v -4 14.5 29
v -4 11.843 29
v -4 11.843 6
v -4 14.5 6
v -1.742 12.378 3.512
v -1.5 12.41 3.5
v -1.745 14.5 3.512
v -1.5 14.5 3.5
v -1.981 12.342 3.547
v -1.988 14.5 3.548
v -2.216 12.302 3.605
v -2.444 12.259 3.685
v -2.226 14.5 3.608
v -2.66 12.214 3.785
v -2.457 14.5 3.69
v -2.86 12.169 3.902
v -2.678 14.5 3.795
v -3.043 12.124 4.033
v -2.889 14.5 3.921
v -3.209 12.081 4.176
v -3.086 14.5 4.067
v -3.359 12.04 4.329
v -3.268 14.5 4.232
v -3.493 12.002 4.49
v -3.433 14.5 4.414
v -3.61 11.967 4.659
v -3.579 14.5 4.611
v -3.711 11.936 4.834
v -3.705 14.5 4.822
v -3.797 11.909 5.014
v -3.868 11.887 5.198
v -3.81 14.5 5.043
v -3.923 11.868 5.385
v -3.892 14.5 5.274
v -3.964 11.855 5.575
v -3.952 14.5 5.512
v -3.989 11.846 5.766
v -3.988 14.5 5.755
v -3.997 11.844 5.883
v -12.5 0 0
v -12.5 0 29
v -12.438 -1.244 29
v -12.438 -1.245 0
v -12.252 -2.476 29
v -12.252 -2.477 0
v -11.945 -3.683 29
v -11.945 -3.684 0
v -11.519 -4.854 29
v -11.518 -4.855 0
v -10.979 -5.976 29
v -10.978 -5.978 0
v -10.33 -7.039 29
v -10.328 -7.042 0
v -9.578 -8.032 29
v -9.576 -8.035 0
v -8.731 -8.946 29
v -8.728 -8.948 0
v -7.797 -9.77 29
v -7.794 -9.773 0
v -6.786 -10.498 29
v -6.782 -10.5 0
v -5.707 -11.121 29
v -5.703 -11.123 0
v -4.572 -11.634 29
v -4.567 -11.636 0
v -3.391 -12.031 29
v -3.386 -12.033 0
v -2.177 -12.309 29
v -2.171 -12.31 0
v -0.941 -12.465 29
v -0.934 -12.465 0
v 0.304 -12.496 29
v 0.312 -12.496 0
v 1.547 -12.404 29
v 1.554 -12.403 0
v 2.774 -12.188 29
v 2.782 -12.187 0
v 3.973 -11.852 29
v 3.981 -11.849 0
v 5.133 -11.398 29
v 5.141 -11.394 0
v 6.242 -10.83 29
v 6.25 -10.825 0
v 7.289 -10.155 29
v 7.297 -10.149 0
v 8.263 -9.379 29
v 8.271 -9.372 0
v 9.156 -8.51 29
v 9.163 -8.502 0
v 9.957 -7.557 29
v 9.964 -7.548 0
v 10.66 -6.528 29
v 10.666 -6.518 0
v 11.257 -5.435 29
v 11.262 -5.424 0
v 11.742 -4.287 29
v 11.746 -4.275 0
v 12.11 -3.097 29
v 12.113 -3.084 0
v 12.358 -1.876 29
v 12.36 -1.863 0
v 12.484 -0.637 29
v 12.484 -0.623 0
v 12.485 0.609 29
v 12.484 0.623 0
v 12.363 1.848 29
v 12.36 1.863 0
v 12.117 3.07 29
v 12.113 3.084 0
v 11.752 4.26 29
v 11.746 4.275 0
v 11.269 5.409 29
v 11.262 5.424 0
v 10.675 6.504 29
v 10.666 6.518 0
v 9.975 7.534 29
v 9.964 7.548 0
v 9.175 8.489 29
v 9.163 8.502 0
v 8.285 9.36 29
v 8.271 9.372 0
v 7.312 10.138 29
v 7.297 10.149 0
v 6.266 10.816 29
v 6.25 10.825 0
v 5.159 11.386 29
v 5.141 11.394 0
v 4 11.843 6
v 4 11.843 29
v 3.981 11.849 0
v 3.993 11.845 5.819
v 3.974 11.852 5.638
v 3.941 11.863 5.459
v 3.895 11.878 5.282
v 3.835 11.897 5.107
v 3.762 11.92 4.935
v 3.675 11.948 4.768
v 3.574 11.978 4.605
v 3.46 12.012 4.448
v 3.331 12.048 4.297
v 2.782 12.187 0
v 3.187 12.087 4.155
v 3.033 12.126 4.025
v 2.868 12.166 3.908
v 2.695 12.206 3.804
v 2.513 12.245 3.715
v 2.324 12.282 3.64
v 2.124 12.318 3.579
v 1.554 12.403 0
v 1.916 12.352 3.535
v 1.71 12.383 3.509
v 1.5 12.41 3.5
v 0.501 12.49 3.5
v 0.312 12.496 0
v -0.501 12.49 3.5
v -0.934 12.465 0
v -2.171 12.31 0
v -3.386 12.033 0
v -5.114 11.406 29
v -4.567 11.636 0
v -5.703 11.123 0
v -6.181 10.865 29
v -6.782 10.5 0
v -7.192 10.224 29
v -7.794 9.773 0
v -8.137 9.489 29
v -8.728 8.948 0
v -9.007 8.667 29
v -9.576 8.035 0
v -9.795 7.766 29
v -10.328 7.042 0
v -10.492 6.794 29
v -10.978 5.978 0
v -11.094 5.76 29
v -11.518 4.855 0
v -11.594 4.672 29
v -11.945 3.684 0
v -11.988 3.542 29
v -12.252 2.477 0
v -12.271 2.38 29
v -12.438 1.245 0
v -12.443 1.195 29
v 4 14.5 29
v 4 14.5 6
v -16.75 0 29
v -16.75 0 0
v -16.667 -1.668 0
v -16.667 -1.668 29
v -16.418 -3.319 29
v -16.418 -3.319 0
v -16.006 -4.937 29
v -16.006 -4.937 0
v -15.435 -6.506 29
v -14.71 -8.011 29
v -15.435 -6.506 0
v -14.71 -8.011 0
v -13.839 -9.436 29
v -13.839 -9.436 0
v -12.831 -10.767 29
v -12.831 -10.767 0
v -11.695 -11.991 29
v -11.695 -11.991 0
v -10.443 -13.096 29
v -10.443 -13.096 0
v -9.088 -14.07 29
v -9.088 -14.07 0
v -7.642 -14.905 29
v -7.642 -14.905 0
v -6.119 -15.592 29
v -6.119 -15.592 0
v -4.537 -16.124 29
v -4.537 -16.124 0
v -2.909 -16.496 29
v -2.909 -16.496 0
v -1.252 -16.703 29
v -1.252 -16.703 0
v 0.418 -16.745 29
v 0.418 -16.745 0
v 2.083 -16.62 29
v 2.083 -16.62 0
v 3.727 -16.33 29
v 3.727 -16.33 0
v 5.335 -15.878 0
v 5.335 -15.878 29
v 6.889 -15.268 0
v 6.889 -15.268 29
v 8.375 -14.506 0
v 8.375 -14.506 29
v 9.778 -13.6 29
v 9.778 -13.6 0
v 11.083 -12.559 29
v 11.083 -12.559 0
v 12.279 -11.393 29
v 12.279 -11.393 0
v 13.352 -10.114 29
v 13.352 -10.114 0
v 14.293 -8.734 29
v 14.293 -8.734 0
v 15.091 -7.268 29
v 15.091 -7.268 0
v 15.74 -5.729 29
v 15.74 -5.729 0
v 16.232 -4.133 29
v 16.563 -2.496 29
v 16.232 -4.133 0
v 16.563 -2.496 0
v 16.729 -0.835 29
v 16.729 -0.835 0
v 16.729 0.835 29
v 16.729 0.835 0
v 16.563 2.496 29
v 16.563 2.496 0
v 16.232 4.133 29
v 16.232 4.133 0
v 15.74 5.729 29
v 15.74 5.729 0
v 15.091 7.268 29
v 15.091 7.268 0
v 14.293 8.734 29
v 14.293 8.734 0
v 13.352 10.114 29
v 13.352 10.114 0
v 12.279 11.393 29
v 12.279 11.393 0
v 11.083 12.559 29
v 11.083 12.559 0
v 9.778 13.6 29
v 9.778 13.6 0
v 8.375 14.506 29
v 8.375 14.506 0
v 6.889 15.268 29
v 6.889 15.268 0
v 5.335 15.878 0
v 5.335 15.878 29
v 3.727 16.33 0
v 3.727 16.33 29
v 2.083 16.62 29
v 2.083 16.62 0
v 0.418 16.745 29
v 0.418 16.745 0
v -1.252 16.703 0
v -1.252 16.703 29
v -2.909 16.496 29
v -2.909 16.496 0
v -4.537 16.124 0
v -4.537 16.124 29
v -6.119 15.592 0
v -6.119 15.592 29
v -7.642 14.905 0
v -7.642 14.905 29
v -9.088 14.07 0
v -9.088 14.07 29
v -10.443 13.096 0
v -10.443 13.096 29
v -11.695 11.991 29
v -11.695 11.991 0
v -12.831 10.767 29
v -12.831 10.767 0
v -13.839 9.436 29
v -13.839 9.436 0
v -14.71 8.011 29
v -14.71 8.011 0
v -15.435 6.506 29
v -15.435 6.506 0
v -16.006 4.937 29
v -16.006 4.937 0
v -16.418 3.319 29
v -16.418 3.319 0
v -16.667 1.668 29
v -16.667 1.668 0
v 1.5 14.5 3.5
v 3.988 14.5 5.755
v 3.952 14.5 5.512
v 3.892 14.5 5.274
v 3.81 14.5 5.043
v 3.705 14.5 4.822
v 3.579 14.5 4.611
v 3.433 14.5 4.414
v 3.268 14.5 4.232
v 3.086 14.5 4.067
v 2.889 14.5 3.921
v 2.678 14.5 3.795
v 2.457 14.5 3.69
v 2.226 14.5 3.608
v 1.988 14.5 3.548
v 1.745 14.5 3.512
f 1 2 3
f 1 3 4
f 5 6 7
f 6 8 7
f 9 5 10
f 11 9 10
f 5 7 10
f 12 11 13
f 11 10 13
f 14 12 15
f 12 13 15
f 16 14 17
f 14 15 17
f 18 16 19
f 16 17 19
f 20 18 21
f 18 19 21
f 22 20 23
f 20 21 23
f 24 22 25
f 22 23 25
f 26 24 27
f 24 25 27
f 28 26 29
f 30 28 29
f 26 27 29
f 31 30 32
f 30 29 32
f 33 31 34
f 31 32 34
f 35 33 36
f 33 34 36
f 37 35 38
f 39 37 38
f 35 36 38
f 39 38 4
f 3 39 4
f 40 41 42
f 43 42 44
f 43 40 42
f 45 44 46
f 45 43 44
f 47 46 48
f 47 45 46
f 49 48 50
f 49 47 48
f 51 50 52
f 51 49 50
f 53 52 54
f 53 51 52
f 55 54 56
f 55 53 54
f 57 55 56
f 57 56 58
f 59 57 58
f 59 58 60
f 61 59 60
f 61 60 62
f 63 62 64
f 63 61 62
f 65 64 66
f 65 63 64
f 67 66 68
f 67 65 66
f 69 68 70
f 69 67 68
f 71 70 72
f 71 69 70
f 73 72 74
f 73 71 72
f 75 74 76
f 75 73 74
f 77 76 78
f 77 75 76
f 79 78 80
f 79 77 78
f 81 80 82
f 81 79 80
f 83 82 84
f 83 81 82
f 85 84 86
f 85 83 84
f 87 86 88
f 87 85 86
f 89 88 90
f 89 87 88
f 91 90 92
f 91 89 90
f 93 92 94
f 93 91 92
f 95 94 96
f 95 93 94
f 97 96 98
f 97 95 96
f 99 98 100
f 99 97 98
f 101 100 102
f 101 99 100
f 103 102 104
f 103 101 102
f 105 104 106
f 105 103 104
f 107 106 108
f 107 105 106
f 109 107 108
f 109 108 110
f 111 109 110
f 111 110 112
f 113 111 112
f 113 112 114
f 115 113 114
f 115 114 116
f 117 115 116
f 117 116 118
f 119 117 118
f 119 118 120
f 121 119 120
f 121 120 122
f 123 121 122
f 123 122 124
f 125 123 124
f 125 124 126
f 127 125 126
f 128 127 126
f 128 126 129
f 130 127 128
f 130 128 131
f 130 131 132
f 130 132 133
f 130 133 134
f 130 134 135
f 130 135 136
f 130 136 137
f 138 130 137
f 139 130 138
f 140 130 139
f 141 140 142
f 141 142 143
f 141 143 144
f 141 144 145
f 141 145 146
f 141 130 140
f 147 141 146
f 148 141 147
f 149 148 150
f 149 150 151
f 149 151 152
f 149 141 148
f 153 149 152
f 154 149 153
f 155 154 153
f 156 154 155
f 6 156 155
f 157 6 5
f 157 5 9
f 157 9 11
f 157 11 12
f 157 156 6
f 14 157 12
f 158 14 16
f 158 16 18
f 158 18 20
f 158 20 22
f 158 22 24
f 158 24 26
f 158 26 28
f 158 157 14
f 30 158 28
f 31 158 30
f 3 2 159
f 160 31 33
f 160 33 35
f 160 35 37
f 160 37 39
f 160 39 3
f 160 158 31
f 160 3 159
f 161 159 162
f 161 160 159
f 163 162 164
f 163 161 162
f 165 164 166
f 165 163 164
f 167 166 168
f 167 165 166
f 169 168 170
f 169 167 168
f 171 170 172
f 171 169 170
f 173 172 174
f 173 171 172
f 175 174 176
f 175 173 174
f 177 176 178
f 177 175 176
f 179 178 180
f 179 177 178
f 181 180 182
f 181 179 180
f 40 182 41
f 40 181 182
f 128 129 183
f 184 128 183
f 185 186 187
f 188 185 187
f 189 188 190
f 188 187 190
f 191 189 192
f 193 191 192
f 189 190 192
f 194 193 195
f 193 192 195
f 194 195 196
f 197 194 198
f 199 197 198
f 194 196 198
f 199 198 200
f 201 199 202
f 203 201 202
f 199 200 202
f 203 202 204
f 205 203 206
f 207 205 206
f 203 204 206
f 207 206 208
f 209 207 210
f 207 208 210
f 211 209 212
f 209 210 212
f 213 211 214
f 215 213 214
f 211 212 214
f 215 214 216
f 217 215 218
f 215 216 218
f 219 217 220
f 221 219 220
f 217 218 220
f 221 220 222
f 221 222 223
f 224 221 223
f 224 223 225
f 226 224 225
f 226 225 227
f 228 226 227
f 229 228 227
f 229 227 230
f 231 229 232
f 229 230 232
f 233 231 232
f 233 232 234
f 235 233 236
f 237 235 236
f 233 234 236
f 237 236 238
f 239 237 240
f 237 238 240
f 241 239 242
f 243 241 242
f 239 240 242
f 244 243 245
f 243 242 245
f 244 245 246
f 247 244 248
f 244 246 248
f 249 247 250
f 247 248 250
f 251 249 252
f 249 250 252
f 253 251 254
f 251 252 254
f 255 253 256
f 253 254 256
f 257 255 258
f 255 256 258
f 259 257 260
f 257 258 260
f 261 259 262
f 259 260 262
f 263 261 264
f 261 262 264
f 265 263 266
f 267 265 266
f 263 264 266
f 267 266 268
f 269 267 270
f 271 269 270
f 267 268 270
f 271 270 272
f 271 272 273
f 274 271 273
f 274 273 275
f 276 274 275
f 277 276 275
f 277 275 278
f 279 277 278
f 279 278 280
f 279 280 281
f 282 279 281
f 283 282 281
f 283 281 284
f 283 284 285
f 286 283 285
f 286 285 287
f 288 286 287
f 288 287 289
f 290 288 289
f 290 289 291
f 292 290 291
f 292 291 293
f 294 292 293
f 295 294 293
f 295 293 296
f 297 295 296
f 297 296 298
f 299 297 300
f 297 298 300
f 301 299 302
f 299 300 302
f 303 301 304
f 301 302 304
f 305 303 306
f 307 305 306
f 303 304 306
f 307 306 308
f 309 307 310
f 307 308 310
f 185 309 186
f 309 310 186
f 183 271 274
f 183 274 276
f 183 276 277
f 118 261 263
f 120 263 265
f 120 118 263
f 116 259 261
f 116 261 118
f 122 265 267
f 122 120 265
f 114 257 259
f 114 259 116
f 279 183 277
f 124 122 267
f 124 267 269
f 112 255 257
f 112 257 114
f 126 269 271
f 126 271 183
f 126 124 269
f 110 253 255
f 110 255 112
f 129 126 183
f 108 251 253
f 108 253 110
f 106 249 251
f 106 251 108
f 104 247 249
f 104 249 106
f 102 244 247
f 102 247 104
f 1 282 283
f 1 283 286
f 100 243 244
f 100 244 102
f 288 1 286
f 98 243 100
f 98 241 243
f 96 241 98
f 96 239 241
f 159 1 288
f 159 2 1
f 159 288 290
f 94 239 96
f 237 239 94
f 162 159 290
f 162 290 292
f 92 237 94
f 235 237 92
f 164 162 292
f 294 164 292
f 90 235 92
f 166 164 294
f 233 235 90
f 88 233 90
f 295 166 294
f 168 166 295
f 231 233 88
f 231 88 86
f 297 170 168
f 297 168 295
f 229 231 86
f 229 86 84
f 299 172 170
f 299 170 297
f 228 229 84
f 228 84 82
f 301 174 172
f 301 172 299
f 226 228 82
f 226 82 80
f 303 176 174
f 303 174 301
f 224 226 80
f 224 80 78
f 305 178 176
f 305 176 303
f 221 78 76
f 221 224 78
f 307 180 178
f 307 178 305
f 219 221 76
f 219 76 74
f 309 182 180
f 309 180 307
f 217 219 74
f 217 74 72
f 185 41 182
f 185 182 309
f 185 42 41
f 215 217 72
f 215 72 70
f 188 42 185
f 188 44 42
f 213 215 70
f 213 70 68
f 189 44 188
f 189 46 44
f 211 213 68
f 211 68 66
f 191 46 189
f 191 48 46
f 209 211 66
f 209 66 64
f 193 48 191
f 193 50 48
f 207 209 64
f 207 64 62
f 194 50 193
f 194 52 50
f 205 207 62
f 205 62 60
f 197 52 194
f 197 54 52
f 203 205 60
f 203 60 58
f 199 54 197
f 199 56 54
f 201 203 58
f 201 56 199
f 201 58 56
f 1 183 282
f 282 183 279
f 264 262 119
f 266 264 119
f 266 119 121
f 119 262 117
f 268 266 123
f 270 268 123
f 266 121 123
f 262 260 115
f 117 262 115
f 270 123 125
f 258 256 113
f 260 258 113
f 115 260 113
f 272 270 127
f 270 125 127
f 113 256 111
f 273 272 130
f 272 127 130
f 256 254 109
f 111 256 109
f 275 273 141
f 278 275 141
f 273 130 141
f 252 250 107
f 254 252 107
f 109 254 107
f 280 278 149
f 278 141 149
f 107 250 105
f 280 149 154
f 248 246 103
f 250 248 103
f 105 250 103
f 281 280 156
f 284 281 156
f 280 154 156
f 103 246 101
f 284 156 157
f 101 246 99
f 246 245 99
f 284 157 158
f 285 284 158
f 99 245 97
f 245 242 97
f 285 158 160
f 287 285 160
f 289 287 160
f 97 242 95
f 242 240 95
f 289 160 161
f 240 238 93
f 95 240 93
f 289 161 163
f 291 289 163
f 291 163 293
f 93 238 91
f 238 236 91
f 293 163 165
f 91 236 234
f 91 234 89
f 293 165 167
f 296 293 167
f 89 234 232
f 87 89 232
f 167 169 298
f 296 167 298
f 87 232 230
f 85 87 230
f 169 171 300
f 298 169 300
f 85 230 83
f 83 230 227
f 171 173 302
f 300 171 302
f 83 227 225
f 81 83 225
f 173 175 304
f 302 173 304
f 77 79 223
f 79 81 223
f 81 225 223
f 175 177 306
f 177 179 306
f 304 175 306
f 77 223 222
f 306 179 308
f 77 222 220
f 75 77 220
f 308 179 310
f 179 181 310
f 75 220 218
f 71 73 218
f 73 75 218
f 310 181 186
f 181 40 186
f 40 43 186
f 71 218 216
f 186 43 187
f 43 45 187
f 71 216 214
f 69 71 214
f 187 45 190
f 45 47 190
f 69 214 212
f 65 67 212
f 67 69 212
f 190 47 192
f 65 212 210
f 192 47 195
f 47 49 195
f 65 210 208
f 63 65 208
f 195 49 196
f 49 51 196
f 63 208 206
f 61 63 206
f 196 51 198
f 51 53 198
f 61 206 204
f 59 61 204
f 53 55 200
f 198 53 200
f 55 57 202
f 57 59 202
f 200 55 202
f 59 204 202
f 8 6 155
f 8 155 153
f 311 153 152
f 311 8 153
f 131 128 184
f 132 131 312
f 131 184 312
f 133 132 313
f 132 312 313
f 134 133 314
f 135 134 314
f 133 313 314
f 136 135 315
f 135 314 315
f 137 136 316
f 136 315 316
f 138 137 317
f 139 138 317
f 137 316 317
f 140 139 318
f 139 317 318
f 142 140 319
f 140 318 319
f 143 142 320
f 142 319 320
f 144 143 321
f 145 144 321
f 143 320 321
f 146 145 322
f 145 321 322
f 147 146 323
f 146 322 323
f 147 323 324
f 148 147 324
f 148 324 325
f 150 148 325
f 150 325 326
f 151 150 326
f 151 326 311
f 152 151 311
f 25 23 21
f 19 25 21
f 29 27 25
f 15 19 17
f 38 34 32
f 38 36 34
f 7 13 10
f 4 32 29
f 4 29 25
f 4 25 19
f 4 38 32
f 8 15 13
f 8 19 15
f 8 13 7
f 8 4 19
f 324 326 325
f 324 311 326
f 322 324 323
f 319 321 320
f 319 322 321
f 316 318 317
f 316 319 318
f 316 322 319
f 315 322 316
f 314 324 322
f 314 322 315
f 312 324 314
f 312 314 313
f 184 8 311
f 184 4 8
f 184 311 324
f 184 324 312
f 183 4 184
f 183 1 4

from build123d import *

# Parameters (mm, degrees)
SKETCH1_R           = 16.75
SKETCH1_R_2         = 12.5
BOSS_EXTRUDE1_DEPTH = 29
SKETCH2_W           = 8
SKETCH2_H           = 4
CUT_EXTRUDE2_DEPTH  = 25.5
FILLET1_R           = 2.5
FILLET2_R           = 2.5


with BuildPart() as part:
    # Sketch1 → Boss-Extrude1 (new body)
    with BuildSketch(Plane.XY):
        with Locations(Location((0, 0, 0), (0, 0, 180))):
            Circle(SKETCH1_R)
        with Locations(Location((0, 0, 0), (0, 0, 180))):
            Circle(SKETCH1_R_2, mode=Mode.SUBTRACT)
    extrude(amount=BOSS_EXTRUDE1_DEPTH)

    # Sketch2 → Cut-Extrude2 (cut)
    with BuildSketch(Plane.XY.offset(29)):
        with Locations((0, 12.5)):
            Rectangle(SKETCH2_W, SKETCH2_H)
    extrude(amount=-CUT_EXTRUDE2_DEPTH, mode=Mode.SUBTRACT)

    # Fillet1
    fillet1_edges = [part.edges().sort_by_distance(p)[0] for p in [
        (4, 13.171359641, 3.5),
    ]]
    fillet(fillet1_edges, radius=FILLET1_R)

    # Fillet2
    fillet2_edges = [part.edges().sort_by_distance(p)[0] for p in [
        (-4, 13.171359641, 3.5),
    ]]
    fillet(fillet2_edges, radius=FILLET2_R)


solid = part.part
